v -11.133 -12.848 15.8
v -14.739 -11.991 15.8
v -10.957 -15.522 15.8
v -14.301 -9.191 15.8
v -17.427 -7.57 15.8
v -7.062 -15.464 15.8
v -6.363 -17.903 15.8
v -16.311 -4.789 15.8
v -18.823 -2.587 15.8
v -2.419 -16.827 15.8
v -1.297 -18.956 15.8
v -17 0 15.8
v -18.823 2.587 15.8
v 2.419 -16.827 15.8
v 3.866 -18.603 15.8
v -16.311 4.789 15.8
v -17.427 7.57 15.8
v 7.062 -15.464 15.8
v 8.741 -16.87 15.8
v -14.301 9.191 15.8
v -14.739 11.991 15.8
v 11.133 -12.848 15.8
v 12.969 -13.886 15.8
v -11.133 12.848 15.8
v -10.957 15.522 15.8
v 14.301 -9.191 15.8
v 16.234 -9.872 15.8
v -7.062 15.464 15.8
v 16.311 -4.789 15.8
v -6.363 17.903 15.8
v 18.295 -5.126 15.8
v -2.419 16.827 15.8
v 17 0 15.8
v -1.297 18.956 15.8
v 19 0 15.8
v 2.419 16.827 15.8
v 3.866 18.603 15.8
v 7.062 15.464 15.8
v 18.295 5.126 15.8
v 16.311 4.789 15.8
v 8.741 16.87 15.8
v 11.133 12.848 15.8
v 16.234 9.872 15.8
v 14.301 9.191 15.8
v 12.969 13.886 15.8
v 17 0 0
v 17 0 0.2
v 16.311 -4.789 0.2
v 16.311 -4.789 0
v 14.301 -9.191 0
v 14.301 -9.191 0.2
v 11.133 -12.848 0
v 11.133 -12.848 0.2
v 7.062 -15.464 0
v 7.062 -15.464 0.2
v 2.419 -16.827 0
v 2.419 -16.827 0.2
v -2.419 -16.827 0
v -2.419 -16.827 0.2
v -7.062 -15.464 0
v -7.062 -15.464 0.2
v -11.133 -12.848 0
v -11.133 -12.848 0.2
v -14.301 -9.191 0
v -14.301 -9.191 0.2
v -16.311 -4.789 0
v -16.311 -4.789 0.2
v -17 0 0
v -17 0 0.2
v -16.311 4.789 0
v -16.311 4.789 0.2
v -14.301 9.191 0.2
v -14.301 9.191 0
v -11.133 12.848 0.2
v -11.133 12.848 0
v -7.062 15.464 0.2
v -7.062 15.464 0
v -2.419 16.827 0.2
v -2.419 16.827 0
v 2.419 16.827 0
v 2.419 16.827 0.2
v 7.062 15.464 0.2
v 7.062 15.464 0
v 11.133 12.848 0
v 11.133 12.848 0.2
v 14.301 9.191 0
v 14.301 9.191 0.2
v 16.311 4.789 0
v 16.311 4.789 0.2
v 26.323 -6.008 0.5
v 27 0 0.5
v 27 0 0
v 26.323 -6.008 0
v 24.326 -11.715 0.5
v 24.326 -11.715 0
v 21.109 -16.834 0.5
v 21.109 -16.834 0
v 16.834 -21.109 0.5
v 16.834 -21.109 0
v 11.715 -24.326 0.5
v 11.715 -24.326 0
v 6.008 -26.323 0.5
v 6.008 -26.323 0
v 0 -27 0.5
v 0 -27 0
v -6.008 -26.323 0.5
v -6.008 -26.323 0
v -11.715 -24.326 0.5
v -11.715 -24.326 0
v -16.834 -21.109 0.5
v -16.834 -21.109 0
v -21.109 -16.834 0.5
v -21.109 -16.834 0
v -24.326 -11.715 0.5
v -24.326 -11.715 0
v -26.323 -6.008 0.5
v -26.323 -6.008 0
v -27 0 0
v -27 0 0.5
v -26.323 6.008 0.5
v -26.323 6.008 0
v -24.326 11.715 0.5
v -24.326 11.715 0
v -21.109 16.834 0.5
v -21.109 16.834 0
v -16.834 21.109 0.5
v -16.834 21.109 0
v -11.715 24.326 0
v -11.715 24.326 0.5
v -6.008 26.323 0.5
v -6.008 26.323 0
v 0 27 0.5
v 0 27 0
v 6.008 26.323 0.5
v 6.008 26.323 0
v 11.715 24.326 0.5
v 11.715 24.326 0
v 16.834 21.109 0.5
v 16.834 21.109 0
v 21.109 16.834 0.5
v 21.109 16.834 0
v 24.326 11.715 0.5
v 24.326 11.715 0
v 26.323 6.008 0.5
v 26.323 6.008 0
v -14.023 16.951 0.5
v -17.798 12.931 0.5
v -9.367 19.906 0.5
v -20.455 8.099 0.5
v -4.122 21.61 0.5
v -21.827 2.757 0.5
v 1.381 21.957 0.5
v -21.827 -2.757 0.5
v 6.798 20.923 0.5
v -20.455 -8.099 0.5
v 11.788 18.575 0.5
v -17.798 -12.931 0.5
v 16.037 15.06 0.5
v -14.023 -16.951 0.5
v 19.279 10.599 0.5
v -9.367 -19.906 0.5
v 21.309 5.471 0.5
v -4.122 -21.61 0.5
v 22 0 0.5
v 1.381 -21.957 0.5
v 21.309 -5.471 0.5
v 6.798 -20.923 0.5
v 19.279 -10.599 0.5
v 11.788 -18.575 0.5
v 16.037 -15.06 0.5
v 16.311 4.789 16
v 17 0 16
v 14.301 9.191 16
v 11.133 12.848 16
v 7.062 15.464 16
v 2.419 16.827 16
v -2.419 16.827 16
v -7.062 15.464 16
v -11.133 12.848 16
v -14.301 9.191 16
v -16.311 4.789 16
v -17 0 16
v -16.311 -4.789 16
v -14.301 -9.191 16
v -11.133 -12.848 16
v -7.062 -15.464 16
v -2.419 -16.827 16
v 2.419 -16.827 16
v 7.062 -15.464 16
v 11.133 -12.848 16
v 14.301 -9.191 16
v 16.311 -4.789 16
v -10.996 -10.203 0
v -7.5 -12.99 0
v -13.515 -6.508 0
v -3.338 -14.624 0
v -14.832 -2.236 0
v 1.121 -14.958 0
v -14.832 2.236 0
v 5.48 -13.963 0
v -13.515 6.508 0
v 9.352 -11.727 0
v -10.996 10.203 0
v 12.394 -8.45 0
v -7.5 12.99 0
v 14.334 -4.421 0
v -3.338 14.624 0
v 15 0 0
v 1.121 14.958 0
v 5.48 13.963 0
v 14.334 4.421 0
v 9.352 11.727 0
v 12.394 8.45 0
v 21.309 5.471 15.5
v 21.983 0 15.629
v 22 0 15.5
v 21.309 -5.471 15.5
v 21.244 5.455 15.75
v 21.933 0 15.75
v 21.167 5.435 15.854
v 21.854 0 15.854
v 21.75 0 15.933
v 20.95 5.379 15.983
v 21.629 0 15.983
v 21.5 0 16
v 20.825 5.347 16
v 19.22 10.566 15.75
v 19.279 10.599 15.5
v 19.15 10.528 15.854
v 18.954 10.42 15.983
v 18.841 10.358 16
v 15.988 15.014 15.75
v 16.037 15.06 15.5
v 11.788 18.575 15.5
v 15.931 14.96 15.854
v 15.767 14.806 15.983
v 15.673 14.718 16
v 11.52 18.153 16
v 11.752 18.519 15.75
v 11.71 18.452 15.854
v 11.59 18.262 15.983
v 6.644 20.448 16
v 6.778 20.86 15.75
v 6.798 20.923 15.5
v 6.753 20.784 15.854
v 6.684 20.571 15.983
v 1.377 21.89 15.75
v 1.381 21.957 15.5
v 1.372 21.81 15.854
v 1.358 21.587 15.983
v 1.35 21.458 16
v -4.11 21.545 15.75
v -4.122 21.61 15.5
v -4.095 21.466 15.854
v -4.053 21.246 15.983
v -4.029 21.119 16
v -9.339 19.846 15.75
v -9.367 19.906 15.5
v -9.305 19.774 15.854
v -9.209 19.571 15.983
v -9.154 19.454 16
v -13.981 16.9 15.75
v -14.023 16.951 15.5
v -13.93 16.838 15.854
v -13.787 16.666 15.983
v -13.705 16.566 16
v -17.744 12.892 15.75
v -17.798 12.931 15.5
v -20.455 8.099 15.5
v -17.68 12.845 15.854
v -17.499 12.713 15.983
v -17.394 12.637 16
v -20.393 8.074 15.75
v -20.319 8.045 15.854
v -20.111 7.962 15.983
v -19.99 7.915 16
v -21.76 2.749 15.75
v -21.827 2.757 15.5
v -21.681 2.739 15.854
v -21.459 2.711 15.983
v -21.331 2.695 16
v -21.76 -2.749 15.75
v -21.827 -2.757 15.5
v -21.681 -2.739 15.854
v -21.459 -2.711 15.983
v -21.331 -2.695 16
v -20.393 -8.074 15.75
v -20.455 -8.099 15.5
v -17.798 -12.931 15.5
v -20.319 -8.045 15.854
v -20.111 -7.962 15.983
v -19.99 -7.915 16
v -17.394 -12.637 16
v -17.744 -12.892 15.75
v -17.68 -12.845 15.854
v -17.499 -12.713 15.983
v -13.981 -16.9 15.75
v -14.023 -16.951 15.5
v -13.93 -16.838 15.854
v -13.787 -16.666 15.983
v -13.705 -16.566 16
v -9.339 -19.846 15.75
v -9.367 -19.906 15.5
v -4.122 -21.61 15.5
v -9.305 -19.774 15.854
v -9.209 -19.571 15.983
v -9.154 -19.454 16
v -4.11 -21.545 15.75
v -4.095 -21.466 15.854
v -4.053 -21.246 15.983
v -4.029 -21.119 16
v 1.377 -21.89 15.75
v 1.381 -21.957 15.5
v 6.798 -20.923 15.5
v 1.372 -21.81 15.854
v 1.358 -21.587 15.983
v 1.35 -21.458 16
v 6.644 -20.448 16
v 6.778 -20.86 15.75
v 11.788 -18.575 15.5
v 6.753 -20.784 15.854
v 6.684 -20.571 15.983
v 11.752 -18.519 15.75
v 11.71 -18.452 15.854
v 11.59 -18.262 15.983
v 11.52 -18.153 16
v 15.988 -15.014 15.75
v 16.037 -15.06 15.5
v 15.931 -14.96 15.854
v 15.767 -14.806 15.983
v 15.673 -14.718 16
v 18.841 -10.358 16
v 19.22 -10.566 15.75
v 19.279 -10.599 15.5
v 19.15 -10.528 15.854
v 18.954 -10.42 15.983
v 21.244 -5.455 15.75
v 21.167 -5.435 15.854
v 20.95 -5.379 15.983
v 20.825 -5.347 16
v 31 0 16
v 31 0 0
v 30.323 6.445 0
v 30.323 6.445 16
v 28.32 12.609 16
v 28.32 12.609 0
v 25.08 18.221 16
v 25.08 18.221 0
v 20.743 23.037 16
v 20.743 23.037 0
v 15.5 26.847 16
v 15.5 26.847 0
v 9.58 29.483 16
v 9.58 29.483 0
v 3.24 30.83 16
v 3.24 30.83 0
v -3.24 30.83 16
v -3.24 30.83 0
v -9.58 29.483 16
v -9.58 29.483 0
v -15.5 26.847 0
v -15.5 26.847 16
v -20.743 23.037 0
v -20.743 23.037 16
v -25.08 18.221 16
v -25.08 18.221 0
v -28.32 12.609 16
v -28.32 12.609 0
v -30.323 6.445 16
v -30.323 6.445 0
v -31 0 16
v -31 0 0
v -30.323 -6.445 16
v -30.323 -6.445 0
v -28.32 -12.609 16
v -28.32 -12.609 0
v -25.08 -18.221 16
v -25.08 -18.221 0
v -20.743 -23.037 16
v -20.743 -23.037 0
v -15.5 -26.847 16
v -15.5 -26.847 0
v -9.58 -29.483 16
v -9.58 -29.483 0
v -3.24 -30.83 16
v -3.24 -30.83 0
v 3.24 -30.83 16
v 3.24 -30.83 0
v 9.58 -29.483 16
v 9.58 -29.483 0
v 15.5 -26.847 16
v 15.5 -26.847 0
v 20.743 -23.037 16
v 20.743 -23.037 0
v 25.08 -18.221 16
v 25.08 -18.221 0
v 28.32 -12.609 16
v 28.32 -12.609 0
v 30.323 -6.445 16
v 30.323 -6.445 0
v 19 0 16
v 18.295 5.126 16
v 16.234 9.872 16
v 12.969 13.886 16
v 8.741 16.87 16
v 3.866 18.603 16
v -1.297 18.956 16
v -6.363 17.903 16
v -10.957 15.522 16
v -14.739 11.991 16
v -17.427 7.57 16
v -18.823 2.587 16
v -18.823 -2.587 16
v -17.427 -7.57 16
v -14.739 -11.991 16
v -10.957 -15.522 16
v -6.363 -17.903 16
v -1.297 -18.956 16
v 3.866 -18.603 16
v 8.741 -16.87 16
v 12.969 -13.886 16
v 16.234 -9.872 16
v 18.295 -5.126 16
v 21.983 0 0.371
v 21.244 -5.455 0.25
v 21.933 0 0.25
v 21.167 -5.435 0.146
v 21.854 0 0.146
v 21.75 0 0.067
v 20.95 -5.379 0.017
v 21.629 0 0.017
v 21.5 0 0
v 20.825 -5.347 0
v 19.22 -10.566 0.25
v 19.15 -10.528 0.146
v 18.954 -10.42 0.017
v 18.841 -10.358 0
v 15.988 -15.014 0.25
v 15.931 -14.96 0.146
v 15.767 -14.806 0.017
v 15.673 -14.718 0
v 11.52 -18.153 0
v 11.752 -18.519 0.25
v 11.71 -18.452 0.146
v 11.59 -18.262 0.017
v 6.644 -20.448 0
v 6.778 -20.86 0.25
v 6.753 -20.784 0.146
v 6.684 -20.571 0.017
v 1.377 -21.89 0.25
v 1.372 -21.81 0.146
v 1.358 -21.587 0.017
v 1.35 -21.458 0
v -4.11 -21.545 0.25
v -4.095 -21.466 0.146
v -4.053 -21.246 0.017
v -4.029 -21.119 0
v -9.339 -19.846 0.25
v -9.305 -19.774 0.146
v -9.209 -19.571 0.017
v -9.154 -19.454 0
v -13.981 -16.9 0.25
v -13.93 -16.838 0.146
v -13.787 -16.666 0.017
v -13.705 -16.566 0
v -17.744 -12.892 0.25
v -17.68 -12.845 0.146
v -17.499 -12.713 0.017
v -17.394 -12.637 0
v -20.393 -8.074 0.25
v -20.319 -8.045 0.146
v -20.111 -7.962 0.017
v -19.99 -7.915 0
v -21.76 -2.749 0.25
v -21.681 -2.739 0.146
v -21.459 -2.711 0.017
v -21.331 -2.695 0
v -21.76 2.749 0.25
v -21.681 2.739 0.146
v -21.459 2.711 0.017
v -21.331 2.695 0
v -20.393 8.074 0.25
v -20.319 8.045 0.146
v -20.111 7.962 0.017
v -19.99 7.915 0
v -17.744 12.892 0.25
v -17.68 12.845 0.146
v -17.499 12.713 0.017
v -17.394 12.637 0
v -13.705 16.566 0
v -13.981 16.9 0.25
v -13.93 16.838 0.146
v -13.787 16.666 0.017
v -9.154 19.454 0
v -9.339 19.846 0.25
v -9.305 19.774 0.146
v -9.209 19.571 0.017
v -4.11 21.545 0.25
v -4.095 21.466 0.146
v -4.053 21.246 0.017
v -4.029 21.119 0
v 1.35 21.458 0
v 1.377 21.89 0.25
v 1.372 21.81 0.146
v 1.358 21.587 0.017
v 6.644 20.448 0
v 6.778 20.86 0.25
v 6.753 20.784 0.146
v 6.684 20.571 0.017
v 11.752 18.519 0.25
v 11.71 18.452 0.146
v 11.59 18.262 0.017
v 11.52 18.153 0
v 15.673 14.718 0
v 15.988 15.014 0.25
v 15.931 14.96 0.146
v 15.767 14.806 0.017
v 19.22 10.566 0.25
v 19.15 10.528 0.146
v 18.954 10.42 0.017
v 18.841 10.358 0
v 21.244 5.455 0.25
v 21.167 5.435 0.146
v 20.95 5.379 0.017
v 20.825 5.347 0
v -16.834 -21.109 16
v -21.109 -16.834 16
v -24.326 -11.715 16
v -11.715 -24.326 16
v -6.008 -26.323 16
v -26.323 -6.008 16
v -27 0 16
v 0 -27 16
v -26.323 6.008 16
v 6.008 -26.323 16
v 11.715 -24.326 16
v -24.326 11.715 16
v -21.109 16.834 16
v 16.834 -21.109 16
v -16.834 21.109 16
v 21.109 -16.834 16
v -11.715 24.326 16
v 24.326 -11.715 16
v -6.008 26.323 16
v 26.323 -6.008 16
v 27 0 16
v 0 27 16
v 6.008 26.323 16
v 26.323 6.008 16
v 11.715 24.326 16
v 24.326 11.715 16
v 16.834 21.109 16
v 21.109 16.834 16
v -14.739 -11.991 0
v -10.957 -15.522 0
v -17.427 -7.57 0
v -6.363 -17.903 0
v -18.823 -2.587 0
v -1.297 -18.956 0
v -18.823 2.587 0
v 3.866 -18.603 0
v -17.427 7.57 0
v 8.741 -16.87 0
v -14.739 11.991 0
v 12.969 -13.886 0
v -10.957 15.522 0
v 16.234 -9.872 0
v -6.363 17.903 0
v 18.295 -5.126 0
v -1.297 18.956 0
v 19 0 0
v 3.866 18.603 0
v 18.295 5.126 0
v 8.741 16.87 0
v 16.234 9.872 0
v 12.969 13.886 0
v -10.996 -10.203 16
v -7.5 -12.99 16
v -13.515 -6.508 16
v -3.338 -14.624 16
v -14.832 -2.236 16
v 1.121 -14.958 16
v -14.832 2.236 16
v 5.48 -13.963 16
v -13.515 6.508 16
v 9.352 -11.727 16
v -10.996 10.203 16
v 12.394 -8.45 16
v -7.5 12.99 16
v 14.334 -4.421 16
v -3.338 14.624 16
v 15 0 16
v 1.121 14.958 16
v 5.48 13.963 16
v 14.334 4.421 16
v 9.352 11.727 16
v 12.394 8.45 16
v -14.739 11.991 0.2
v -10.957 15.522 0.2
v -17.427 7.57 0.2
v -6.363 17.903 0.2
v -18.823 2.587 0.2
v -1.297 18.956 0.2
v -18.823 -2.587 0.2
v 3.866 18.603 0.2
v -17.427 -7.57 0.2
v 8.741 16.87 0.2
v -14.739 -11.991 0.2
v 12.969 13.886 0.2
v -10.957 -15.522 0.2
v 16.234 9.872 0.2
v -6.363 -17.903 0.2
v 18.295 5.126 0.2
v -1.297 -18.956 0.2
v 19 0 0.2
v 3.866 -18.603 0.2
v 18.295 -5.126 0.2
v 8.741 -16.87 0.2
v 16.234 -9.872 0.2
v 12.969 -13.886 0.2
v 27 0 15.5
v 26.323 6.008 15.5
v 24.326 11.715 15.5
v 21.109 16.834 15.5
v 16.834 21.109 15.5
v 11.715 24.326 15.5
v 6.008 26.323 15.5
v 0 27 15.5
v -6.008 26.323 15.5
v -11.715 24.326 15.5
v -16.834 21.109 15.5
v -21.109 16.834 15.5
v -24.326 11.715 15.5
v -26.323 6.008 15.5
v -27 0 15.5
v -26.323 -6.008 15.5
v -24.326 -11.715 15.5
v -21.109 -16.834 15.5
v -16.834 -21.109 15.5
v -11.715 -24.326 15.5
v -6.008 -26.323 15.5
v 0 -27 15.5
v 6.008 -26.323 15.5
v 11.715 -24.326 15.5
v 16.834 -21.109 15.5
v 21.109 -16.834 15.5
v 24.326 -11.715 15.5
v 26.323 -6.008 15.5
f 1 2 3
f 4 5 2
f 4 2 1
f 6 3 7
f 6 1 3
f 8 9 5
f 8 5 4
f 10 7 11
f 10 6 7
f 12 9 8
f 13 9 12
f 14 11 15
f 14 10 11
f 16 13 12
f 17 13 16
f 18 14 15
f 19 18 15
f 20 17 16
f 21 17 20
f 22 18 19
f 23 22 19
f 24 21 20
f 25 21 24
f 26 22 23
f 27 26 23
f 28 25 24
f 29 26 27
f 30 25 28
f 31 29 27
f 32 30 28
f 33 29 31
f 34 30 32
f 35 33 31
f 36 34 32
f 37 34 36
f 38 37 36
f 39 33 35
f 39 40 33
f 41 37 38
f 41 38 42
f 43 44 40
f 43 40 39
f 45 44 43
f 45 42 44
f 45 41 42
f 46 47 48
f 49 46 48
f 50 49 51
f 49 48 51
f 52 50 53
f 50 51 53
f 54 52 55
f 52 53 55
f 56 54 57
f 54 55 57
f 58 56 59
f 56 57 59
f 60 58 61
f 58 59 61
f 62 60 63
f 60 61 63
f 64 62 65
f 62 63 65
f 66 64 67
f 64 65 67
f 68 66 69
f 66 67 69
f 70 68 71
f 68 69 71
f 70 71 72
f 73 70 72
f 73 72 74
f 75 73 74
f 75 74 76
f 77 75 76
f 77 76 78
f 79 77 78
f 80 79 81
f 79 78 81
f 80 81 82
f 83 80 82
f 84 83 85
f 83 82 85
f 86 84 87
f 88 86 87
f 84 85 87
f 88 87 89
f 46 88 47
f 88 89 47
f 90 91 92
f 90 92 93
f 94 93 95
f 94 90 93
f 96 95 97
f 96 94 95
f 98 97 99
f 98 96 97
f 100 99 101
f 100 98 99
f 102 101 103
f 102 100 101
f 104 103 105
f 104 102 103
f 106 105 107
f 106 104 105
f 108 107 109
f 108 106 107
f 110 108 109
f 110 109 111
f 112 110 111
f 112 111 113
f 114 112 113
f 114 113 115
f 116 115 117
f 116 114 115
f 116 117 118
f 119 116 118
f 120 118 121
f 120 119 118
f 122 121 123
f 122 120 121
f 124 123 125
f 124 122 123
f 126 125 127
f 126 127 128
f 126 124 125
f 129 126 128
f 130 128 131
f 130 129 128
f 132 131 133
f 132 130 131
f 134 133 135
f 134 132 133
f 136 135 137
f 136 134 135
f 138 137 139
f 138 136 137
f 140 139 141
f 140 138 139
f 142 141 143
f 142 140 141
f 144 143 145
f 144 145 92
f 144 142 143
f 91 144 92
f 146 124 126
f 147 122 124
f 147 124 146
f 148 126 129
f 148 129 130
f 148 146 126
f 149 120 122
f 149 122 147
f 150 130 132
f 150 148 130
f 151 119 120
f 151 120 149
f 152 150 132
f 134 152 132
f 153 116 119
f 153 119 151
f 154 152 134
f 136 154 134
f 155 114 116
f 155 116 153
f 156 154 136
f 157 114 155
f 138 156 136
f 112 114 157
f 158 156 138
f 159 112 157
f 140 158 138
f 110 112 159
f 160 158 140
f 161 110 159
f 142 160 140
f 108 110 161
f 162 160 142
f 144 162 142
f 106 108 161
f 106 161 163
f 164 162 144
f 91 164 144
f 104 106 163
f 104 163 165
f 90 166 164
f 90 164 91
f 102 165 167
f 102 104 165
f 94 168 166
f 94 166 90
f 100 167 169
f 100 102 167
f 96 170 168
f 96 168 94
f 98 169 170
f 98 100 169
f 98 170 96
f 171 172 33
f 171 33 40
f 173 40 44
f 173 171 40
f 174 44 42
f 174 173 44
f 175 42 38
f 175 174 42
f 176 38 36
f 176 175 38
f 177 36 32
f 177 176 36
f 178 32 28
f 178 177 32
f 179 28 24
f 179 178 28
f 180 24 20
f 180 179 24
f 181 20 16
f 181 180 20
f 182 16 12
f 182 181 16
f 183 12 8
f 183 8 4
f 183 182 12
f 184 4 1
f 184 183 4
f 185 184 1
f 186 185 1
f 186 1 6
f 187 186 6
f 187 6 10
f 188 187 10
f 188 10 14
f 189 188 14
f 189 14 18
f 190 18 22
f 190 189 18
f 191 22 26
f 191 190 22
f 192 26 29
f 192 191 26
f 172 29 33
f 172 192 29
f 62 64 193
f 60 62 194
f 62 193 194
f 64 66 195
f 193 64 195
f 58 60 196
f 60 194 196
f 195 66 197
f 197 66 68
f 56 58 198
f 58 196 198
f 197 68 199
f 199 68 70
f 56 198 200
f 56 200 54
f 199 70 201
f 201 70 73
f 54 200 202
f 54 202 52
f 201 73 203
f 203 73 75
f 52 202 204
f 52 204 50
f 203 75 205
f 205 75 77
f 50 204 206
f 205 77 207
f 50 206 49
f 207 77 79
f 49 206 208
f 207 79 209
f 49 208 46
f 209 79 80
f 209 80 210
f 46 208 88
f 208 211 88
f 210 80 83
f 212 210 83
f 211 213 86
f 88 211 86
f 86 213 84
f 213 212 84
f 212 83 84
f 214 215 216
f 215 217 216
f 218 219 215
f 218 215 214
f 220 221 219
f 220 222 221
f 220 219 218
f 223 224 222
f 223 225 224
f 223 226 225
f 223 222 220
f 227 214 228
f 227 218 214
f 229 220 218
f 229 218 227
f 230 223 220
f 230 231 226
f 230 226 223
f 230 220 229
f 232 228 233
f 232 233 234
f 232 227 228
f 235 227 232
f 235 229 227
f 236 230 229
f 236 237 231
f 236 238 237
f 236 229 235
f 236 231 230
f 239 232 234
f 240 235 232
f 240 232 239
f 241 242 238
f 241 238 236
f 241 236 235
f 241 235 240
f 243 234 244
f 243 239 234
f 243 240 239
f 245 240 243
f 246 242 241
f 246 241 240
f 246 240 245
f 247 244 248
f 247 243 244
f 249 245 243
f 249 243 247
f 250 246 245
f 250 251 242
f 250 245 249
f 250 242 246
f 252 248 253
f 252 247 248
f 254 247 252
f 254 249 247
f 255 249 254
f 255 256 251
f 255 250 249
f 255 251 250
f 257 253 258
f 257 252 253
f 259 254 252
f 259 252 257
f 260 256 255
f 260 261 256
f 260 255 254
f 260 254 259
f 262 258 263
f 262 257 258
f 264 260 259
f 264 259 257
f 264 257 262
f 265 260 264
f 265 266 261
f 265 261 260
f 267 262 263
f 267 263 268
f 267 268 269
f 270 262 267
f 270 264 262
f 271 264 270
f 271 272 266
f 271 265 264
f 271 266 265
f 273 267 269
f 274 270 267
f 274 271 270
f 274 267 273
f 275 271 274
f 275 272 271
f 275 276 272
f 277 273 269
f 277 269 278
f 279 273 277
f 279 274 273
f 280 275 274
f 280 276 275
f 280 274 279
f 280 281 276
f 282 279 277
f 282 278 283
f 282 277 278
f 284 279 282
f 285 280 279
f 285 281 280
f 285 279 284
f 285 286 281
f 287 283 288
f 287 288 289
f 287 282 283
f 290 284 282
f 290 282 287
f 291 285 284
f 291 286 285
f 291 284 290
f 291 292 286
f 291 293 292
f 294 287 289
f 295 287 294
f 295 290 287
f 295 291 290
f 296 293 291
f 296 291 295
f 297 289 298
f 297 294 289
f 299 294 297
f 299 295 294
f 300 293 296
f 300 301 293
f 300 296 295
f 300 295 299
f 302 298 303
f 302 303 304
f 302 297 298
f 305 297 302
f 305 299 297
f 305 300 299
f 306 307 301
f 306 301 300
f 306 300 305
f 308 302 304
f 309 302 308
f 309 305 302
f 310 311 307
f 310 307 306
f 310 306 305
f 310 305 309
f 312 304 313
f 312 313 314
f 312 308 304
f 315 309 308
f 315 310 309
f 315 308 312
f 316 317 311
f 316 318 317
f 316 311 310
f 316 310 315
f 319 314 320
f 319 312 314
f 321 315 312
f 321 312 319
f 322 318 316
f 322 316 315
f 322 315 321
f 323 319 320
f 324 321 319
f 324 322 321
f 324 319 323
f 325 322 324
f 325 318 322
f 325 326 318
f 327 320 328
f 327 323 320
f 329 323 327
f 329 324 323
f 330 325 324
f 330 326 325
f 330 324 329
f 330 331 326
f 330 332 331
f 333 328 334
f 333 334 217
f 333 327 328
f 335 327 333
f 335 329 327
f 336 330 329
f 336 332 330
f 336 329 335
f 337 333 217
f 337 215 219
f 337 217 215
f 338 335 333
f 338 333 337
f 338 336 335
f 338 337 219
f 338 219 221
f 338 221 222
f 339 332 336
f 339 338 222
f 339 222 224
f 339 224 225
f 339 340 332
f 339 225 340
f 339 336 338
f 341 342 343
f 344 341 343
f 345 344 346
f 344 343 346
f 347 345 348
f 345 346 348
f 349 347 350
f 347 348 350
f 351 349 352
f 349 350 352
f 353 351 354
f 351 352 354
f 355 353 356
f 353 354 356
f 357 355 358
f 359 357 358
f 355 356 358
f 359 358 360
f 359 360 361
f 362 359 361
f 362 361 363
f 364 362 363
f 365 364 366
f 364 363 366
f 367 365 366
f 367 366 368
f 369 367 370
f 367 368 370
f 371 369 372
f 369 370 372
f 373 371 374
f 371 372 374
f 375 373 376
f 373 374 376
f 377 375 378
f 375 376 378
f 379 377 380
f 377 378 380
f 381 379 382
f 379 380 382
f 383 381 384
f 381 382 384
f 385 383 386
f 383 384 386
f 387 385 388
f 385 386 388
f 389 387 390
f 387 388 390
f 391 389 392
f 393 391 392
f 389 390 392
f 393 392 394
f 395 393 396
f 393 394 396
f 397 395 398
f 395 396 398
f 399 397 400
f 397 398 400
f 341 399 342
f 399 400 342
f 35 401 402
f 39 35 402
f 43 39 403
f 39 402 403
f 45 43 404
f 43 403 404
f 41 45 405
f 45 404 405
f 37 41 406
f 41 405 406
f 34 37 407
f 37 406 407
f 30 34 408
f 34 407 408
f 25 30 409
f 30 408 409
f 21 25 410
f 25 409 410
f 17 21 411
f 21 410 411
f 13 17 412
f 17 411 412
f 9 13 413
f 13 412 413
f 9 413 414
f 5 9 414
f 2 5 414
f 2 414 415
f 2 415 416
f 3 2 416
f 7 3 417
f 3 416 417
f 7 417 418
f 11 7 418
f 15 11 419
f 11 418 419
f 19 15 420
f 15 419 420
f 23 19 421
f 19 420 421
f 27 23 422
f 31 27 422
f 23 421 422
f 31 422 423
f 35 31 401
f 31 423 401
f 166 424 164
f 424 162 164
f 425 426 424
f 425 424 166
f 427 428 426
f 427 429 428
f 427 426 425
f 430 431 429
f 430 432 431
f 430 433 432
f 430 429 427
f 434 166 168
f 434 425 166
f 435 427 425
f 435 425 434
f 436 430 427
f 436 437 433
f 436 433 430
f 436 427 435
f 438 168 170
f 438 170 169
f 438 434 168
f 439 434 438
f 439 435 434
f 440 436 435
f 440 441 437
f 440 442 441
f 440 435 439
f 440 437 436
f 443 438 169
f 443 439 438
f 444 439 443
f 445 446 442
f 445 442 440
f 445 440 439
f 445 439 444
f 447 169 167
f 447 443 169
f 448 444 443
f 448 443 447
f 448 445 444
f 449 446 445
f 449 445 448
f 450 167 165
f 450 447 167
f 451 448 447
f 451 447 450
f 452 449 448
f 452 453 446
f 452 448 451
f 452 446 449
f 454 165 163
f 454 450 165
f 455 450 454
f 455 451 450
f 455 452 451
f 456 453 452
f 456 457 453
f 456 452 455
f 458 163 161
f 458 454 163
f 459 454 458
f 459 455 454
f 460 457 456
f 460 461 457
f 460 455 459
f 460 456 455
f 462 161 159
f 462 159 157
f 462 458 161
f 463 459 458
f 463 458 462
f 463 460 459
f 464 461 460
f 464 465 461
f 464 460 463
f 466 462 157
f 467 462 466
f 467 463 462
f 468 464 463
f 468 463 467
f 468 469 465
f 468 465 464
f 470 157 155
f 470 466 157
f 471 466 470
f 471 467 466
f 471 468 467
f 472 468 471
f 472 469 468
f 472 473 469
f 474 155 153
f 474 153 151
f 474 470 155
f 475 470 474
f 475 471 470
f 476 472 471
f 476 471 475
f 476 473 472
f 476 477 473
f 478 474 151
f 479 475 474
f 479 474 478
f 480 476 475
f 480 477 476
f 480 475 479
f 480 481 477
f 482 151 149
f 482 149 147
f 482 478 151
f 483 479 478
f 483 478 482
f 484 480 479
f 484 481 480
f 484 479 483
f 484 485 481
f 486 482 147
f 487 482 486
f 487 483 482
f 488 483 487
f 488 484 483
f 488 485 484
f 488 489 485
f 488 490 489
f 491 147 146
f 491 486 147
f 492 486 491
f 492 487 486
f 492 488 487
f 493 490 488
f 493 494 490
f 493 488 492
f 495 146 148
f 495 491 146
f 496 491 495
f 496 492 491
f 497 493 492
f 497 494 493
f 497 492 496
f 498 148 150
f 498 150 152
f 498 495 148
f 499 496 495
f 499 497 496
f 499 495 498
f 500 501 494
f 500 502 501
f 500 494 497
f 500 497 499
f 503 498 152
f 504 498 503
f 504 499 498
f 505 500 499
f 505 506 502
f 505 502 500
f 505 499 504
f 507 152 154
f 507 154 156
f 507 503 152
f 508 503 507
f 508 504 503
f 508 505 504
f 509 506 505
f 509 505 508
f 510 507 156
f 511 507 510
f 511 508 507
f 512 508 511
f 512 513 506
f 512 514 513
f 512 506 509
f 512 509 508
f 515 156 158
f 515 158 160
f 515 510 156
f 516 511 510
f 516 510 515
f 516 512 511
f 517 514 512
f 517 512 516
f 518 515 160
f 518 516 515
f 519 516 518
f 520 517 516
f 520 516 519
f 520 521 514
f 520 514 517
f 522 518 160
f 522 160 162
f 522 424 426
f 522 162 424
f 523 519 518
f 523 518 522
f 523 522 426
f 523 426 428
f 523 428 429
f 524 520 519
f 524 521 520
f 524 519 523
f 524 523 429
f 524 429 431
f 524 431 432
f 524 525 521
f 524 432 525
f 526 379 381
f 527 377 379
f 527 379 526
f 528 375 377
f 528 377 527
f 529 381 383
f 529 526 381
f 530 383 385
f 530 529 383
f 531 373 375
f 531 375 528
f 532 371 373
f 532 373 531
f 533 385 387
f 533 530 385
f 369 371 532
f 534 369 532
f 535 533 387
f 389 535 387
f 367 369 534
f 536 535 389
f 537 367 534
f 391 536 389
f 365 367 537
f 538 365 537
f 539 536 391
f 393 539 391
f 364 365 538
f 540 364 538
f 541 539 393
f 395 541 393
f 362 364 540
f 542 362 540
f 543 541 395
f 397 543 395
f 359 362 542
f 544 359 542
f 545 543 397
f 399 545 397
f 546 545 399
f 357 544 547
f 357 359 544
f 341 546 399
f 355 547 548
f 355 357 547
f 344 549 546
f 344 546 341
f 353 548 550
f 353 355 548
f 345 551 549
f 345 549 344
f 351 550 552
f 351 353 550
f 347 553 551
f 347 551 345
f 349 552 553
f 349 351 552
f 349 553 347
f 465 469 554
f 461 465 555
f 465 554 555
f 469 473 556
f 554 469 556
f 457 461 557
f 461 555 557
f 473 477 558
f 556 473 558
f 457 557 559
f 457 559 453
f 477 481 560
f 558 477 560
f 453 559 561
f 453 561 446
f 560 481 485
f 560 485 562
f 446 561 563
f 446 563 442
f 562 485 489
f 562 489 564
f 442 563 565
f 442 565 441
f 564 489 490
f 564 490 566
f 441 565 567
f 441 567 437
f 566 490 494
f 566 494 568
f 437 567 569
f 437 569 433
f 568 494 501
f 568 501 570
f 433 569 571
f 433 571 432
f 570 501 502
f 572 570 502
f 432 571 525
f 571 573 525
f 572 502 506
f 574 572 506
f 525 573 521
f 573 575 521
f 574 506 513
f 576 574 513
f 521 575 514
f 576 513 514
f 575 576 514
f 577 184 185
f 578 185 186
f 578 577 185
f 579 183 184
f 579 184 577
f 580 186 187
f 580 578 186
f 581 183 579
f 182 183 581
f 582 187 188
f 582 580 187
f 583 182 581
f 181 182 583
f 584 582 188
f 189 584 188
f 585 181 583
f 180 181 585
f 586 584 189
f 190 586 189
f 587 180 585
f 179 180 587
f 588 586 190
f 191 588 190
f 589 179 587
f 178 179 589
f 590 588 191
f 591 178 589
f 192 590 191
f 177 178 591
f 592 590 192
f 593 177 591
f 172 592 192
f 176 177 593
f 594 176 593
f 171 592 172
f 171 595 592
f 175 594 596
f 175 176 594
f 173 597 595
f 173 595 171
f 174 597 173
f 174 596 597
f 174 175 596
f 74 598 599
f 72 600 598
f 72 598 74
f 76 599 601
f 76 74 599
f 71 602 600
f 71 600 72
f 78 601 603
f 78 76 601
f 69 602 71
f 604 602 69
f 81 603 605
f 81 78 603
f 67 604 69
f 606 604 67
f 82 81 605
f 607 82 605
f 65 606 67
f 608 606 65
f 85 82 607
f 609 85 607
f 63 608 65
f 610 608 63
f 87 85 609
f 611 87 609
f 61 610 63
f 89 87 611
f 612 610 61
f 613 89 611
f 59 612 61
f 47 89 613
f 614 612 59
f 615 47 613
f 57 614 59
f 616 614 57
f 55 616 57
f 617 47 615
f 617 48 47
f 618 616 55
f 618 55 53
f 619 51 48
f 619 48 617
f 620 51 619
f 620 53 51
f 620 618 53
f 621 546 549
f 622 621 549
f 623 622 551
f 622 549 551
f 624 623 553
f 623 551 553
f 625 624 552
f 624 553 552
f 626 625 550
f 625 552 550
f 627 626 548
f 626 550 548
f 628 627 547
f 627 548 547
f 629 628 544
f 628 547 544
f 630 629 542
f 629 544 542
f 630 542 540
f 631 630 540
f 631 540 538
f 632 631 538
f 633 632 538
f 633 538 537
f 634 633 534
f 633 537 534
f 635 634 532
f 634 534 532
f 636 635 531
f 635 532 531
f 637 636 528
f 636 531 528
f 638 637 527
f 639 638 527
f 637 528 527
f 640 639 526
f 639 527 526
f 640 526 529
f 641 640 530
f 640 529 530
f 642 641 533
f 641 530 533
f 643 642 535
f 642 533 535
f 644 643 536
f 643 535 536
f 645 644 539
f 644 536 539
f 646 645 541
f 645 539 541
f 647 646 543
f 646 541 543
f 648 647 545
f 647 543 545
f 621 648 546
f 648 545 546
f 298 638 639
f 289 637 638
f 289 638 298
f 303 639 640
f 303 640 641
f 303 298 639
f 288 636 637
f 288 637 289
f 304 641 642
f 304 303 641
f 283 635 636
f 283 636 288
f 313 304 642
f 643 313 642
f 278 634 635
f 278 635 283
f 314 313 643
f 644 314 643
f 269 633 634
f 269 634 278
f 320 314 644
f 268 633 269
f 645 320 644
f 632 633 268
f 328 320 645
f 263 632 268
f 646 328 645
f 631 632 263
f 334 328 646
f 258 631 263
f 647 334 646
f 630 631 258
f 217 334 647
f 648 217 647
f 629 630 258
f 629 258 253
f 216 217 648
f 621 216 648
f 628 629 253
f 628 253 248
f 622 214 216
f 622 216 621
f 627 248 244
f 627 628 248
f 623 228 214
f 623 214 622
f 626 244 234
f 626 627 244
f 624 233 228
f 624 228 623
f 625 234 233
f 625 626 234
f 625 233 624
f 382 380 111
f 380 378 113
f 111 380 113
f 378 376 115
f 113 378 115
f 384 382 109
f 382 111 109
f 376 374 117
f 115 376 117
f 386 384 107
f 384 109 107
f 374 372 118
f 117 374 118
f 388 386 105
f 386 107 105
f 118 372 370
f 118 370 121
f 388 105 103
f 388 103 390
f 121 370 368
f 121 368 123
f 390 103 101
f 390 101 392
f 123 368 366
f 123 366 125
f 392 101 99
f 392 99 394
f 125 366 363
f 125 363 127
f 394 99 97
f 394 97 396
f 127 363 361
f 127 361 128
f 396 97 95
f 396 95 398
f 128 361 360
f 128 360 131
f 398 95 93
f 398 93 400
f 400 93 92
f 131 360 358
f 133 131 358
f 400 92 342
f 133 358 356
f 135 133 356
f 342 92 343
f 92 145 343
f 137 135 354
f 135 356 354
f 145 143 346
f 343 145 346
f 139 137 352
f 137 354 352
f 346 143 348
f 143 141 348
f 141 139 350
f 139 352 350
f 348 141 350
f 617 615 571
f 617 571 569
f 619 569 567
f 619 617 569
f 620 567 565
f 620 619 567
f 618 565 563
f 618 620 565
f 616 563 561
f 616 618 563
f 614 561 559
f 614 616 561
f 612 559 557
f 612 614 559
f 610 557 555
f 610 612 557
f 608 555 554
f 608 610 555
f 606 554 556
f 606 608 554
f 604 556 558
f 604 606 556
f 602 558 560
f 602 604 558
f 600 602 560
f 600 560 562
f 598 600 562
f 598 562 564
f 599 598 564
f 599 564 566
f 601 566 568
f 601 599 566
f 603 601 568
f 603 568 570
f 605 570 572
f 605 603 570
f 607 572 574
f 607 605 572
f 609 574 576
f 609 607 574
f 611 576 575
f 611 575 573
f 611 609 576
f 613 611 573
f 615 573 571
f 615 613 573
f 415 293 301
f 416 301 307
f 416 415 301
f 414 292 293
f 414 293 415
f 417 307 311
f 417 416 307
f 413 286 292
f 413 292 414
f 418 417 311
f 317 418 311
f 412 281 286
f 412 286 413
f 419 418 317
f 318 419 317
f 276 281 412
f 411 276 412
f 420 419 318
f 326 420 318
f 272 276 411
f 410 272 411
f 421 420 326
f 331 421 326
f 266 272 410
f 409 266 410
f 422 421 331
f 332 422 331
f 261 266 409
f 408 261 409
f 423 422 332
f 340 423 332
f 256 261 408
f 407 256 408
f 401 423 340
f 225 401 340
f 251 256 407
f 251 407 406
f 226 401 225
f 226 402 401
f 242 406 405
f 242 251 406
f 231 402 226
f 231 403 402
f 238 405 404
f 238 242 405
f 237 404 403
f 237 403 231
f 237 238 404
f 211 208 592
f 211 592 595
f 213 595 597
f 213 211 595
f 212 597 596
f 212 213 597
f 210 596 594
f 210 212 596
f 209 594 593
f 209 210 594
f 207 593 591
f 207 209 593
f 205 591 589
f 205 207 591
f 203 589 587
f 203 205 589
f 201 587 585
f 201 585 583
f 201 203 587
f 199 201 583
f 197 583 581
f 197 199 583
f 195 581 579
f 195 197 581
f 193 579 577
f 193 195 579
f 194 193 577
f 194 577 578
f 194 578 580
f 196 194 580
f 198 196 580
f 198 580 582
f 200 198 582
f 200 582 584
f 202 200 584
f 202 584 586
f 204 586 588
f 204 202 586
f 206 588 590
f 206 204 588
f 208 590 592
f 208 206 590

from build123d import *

# Parameters (mm, degrees)
SKETCH_1_R          = 31
SKETCH_1_R_2        = 15
EXTRUDE_1_DEPTH     = 16
SKETCH_2_R          = 27
SKETCH_2_R_2        = 22
CUT_EXTRUDE_1_DEPTH = 0.5
CUT_EXTRUDE_START   = -0.5
SKETCH_3_R          = 27
SKETCH_3_R_2        = 22
CUT_EXTRUDE_2_DEPTH = 0.5
SKETCH_4_R          = 19
SKETCH_4_R_2        = 17
CUT_EXTRUDE_3_DEPTH = 0.2
FILLET_1_R          = 0.5
CUT_EXTRUDE_START_2 = -0.2
SKETCH_5_R          = 19
SKETCH_5_R_2        = 17
CUT_EXTRUDE_4_DEPTH = 0.2


with BuildPart() as part:
    # 草图1 → 凸台-拉伸1 (new body)
    with BuildSketch(Plane.XY):
        Circle(SKETCH_1_R)
        Circle(SKETCH_1_R_2, mode=Mode.SUBTRACT)
    extrude(amount=EXTRUDE_1_DEPTH)

    # 草图2 → 切除-拉伸1 (cut)
    with BuildSketch(Plane.XY.offset(16)):
        Circle(SKETCH_2_R)
        Circle(SKETCH_2_R_2, mode=Mode.SUBTRACT)
    extrude(amount=-CUT_EXTRUDE_1_DEPTH, mode=Mode.SUBTRACT)

    # 草图3 → 切除-拉伸2 (cut)
    with BuildSketch(Plane(origin=(0, 0, 0), x_dir=(-1, 0, 0), z_dir=(0, 0, -1)).offset(CUT_EXTRUDE_START)):
        with Locations(Location((0, 0, 0), (0, 0, 180))):
            Circle(SKETCH_3_R)
        with Locations(Location((0, 0, 0), (0, 0, 180))):
            Circle(SKETCH_3_R_2, mode=Mode.SUBTRACT)
    extrude(amount=CUT_EXTRUDE_2_DEPTH, mode=Mode.SUBTRACT)

    # 草图4 → 切除-拉伸3 (cut)
    with BuildSketch(Plane.XY.offset(16)):
        Circle(SKETCH_4_R)
        Circle(SKETCH_4_R_2, mode=Mode.SUBTRACT)
    extrude(amount=-CUT_EXTRUDE_3_DEPTH, mode=Mode.SUBTRACT)

    # 圆角1
    fillet_1_edges = [part.edges().sort_by_distance(p)[0] for p in [
        (-22, 0, 16),
        (-22, 0, 0),
    ]]
    fillet(fillet_1_edges, radius=FILLET_1_R - 0.0001)  # a hair under: the kernel refuses the full size

    # 草图5 → 切除-拉伸4 (cut)
    with BuildSketch(Plane(origin=(0, 0, 0), x_dir=(-1, 0, 0), z_dir=(0, 0, -1)).offset(CUT_EXTRUDE_START_2)):
        with Locations(Location((0, 0, 0), (0, 0, 180))):
            Circle(SKETCH_5_R)
        with Locations(Location((0, 0, 0), (0, 0, 180))):
            Circle(SKETCH_5_R_2, mode=Mode.SUBTRACT)
    extrude(amount=CUT_EXTRUDE_4_DEPTH, mode=Mode.SUBTRACT)


solid = part.part
